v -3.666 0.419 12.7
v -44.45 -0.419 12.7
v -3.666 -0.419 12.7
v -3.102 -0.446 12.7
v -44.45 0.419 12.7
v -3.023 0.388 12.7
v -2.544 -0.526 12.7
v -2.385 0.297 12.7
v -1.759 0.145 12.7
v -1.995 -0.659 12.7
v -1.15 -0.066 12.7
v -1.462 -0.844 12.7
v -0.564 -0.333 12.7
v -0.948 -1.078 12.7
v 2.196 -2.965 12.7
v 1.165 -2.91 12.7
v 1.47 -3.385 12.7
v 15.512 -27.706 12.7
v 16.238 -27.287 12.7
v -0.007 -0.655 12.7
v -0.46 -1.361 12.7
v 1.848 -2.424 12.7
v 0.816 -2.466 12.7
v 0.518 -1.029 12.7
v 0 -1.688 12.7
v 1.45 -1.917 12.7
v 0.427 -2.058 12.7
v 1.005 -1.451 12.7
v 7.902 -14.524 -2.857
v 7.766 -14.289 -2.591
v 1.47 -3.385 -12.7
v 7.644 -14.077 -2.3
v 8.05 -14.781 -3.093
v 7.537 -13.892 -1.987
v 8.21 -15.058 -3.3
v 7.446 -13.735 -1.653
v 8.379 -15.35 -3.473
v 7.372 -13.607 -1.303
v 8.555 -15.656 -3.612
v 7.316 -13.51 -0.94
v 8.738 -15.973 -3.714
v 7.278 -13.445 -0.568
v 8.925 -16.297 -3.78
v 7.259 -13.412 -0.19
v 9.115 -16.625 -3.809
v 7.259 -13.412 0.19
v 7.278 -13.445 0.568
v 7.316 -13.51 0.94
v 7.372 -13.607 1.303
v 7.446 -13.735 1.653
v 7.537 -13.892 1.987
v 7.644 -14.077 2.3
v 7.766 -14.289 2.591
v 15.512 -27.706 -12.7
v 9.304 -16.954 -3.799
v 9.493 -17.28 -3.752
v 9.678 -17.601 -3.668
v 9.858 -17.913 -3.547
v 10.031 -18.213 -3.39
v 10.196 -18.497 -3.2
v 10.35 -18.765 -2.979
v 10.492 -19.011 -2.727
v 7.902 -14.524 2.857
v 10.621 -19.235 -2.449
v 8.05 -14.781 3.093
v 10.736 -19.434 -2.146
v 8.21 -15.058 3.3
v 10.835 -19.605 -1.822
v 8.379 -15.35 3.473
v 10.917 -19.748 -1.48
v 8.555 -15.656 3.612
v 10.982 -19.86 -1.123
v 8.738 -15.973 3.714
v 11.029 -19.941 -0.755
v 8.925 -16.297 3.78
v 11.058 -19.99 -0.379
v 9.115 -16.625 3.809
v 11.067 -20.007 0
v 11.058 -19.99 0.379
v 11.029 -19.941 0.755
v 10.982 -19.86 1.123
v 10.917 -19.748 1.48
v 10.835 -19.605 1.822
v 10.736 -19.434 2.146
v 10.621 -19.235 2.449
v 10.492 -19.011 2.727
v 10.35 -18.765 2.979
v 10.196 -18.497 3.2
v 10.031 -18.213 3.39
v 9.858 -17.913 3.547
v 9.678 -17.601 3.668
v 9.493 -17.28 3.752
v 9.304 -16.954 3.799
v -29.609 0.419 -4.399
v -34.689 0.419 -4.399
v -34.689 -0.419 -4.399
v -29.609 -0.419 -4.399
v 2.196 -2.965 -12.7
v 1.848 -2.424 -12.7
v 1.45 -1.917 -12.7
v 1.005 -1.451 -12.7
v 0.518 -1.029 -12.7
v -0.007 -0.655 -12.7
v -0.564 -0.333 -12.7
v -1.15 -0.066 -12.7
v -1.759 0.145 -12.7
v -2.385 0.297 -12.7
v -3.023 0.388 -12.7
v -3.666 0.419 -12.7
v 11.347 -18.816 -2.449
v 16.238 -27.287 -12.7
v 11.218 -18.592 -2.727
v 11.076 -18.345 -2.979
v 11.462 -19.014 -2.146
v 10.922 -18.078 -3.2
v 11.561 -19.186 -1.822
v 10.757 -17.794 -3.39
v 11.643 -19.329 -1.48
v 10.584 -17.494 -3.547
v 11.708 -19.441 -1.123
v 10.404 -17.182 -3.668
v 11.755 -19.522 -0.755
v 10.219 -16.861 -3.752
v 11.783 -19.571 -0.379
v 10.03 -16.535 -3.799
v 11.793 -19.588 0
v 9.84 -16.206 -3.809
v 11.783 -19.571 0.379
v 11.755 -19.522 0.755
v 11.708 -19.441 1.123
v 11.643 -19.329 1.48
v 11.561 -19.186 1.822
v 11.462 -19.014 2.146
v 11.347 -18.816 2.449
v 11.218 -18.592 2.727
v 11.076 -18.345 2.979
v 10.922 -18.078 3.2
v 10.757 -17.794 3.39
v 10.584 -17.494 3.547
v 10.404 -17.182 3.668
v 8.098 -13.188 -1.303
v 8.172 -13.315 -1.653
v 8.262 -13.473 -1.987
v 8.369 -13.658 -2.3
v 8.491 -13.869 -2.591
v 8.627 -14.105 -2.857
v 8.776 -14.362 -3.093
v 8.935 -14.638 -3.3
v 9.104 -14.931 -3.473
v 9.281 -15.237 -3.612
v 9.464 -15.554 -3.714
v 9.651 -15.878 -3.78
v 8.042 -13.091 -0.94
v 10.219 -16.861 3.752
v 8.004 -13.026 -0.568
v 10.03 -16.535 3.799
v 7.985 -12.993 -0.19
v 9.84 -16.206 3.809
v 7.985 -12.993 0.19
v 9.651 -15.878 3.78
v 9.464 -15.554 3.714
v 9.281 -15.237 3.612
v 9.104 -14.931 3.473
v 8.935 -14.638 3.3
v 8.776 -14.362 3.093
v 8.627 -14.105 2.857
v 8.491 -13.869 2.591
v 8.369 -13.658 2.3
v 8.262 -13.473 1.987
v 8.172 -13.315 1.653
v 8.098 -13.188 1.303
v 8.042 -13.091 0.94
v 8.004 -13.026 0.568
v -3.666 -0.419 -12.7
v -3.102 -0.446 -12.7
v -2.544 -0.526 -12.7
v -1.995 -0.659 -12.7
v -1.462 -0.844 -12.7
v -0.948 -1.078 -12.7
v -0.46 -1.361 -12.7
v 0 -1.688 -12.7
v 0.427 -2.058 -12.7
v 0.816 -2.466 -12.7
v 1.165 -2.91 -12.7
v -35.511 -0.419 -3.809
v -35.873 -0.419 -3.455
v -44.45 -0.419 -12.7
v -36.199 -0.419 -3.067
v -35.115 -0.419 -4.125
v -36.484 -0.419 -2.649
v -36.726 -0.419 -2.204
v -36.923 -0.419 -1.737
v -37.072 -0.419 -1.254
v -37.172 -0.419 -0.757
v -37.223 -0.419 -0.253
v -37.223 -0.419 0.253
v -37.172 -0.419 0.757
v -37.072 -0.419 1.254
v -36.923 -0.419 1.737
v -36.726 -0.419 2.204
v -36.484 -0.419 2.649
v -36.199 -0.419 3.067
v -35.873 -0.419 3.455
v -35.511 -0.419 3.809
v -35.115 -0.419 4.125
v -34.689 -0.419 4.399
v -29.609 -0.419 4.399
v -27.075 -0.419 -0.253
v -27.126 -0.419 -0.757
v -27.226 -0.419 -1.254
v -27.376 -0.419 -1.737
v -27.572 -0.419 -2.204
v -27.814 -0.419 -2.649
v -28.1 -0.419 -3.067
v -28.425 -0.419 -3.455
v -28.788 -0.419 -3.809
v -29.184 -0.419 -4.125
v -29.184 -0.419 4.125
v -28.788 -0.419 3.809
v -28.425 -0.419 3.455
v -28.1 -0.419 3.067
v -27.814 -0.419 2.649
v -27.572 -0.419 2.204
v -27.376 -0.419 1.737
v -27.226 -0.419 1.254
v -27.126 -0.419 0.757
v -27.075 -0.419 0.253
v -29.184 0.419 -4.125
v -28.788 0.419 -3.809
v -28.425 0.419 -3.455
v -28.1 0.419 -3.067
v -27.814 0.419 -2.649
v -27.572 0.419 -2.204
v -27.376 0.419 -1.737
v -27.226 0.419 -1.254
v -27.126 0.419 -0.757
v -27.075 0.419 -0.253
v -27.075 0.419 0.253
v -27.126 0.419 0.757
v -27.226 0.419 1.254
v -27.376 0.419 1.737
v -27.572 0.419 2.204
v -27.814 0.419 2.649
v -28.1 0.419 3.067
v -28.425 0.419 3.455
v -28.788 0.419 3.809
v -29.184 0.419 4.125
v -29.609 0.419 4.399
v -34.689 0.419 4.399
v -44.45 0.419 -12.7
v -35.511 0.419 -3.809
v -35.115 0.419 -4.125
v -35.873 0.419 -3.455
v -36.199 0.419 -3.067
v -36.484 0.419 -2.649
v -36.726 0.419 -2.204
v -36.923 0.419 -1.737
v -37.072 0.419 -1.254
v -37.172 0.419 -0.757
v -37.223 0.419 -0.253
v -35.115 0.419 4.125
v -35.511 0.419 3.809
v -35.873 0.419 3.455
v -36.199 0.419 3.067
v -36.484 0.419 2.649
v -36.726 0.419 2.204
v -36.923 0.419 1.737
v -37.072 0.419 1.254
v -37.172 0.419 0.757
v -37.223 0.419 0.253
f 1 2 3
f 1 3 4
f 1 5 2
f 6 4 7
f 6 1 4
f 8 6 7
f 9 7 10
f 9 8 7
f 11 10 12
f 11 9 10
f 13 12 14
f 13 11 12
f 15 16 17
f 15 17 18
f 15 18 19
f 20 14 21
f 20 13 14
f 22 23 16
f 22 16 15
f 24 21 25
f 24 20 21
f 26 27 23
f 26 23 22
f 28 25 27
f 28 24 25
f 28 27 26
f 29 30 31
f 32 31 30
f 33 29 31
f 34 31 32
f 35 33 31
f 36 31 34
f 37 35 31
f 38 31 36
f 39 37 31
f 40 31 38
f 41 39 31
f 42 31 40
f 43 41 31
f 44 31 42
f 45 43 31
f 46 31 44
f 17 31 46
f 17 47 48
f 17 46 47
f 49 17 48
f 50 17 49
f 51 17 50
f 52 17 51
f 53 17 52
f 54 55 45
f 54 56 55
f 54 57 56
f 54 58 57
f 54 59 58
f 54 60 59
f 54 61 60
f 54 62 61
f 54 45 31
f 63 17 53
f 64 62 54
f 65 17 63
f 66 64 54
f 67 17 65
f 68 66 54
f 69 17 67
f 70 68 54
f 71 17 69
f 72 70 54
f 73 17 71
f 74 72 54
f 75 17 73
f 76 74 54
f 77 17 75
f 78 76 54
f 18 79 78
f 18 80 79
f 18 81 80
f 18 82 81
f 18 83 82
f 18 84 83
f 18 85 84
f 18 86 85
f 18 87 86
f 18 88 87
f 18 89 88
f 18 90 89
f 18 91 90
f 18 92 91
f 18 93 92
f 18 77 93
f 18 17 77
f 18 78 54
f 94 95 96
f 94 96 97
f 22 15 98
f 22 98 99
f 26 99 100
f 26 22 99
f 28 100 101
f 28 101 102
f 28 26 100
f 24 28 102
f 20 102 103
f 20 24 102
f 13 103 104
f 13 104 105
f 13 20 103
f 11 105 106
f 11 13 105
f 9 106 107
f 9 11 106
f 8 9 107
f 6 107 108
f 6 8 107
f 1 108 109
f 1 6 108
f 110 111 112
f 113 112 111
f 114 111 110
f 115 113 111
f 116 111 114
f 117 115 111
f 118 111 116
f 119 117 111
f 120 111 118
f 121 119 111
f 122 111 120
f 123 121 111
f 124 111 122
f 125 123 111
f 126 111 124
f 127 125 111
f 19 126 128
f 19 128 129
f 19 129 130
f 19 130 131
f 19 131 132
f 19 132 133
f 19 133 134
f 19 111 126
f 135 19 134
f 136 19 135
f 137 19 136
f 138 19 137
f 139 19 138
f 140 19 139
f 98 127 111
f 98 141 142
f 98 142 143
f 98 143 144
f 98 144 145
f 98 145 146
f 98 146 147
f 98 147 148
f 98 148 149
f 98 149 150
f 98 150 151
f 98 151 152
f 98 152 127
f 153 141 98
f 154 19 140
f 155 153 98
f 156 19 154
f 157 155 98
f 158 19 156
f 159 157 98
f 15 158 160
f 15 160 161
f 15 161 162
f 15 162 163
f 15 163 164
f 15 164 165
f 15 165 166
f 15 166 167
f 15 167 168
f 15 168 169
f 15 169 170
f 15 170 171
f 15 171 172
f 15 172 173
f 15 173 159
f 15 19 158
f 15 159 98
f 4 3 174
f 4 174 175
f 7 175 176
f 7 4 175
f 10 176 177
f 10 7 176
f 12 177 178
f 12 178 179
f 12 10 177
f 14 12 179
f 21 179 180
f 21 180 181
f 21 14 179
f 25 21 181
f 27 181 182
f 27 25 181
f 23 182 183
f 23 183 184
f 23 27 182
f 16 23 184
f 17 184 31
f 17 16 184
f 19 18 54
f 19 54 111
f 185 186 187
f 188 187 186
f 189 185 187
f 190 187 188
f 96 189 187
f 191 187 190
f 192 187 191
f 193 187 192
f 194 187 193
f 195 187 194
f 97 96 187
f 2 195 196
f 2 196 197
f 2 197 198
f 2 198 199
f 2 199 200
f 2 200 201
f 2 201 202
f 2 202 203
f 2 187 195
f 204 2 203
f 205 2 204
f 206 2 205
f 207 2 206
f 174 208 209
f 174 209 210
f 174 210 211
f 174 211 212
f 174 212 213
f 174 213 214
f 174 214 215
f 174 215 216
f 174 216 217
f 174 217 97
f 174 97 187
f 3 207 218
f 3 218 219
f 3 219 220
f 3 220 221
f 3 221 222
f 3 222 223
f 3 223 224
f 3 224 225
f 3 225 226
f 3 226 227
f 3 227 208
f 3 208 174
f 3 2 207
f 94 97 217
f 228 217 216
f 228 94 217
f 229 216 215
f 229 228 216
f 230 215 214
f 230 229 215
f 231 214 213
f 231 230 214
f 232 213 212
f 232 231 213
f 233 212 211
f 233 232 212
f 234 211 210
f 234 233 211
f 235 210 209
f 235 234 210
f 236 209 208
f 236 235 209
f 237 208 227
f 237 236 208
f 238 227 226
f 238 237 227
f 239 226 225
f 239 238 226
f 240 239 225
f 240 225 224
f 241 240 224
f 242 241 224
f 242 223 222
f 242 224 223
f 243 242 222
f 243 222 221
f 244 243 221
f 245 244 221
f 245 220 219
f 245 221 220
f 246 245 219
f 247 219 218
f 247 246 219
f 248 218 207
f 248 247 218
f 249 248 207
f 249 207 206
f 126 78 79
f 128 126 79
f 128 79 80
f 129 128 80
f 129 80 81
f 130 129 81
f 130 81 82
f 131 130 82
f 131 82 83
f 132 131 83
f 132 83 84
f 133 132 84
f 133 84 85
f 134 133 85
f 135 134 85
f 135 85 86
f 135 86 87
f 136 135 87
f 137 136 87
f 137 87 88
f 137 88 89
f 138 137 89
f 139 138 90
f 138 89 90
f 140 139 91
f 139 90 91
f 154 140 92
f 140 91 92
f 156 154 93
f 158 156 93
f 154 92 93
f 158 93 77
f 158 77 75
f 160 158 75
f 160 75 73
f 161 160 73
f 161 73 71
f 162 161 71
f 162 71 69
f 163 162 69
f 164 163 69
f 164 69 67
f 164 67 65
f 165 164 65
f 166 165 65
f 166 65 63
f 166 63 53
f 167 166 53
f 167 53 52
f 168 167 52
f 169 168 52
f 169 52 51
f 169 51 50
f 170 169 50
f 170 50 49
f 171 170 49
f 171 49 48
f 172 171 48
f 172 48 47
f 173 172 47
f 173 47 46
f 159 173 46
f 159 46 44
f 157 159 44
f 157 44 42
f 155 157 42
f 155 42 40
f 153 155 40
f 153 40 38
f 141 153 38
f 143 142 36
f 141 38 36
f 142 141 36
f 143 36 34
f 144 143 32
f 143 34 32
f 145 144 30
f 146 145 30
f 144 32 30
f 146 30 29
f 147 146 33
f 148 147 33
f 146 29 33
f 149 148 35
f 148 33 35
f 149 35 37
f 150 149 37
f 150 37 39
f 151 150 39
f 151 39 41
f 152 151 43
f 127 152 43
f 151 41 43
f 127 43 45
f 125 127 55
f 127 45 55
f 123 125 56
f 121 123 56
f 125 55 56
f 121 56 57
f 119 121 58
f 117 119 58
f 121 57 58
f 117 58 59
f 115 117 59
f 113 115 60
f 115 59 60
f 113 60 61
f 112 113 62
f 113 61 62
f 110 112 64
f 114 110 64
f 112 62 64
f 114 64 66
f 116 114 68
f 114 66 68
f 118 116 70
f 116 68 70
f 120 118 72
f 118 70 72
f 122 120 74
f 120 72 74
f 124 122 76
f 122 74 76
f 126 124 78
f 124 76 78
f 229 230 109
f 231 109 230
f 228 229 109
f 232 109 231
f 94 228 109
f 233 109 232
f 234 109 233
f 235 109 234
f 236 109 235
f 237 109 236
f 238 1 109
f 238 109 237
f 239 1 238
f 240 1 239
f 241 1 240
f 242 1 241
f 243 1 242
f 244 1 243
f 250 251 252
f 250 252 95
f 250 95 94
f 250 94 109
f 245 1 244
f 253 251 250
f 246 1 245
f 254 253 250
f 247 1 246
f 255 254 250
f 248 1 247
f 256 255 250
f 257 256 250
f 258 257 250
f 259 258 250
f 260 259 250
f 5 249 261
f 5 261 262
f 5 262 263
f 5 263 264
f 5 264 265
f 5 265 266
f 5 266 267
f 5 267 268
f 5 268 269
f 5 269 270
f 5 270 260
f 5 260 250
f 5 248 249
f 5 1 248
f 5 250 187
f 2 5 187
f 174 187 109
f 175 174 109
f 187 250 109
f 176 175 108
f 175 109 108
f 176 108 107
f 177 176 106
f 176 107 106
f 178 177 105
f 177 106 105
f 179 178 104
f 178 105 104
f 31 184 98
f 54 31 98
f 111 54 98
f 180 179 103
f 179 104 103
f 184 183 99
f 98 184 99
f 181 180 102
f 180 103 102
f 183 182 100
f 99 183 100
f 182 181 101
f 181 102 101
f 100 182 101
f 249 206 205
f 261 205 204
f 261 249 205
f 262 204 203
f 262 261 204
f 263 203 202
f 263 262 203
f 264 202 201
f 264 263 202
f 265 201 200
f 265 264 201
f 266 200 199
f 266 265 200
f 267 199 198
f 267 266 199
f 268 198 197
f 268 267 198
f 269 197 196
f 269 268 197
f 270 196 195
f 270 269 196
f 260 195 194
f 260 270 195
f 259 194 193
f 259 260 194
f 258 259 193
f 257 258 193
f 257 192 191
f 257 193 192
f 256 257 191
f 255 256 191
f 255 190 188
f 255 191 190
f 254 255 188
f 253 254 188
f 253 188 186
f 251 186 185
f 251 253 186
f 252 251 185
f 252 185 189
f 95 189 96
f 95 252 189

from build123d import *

# Parameters (mm, degrees)
EXTRUDE_THIN1_DEPTH = 12.7
CUT_EXTRUDE1_DEPTH  = 55.111973556
SKETCH3_R           = 3.81
CUT_EXTRUDE2_DEPTH  = 54.488360816


with BuildPart() as part:
    # Sketch1 → Extrude-Thin1 (new, symmetric)
    with BuildSketch(Plane.XY):
        with BuildLine():
            Line((-44.45, -0.4191), (-3.666174209, -0.4191))
            ThreePointArc((-3.666174209, -0.4191), (-0.700724209, -1.213689933), (1.470135858, -3.38455))
            Line((1.470135858, -3.38455), (15.512048753, -27.70585657))
            Line((15.512048753, -27.70585657), (16.237951247, -27.28675657))
            Line((16.237951247, -27.28675657), (2.196038351, -2.96545))
            ThreePointArc((2.196038351, -2.96545), (-0.281624209, -0.487787439), (-3.666174209, 0.4191))
            Line((-3.666174209, 0.4191), (-44.45, 0.4191))
            Line((-44.45, 0.4191), (-44.45, -0.4191))
        make_face()
    extrude(amount=EXTRUDE_THIN1_DEPTH, both=True)

    # Sketch2 → Cut-Extrude1 (cut, through all)
    with BuildSketch(Plane(origin=(0, 0.4191, 0), x_dir=(1, 0, 0), z_dir=(0, 1, 0))):
        with BuildLine():
            Line((-34.689149884, 4.399409051), (-29.609149884, 4.399409051))
            ThreePointArc((-29.609149884, 4.399409051), (-27.069149884, 0), (-29.609149884, -4.399409051))
            Line((-29.609149884, -4.399409051), (-34.689149884, -4.399409051))
            ThreePointArc((-34.689149884, -4.399409051), (-37.229149884, 0), (-34.689149884, 4.399409051))
        make_face()
    extrude(amount=-CUT_EXTRUDE1_DEPTH, mode=Mode.SUBTRACT)

    # Sketch3 → Cut-Extrude2 (cut, through all)
    with BuildSketch(Plane(origin=(-0.362951247, -0.20955, 0), x_dir=(0, 0, 1), z_dir=(-0.8660254037844389, -0.49999999999999983, 0))):
        with Locations(Location((0, -19.05, 0), (0, 0, 270))):
            Circle(SKETCH3_R)
    extrude(amount=-CUT_EXTRUDE2_DEPTH, mode=Mode.SUBTRACT)


solid = part.part
